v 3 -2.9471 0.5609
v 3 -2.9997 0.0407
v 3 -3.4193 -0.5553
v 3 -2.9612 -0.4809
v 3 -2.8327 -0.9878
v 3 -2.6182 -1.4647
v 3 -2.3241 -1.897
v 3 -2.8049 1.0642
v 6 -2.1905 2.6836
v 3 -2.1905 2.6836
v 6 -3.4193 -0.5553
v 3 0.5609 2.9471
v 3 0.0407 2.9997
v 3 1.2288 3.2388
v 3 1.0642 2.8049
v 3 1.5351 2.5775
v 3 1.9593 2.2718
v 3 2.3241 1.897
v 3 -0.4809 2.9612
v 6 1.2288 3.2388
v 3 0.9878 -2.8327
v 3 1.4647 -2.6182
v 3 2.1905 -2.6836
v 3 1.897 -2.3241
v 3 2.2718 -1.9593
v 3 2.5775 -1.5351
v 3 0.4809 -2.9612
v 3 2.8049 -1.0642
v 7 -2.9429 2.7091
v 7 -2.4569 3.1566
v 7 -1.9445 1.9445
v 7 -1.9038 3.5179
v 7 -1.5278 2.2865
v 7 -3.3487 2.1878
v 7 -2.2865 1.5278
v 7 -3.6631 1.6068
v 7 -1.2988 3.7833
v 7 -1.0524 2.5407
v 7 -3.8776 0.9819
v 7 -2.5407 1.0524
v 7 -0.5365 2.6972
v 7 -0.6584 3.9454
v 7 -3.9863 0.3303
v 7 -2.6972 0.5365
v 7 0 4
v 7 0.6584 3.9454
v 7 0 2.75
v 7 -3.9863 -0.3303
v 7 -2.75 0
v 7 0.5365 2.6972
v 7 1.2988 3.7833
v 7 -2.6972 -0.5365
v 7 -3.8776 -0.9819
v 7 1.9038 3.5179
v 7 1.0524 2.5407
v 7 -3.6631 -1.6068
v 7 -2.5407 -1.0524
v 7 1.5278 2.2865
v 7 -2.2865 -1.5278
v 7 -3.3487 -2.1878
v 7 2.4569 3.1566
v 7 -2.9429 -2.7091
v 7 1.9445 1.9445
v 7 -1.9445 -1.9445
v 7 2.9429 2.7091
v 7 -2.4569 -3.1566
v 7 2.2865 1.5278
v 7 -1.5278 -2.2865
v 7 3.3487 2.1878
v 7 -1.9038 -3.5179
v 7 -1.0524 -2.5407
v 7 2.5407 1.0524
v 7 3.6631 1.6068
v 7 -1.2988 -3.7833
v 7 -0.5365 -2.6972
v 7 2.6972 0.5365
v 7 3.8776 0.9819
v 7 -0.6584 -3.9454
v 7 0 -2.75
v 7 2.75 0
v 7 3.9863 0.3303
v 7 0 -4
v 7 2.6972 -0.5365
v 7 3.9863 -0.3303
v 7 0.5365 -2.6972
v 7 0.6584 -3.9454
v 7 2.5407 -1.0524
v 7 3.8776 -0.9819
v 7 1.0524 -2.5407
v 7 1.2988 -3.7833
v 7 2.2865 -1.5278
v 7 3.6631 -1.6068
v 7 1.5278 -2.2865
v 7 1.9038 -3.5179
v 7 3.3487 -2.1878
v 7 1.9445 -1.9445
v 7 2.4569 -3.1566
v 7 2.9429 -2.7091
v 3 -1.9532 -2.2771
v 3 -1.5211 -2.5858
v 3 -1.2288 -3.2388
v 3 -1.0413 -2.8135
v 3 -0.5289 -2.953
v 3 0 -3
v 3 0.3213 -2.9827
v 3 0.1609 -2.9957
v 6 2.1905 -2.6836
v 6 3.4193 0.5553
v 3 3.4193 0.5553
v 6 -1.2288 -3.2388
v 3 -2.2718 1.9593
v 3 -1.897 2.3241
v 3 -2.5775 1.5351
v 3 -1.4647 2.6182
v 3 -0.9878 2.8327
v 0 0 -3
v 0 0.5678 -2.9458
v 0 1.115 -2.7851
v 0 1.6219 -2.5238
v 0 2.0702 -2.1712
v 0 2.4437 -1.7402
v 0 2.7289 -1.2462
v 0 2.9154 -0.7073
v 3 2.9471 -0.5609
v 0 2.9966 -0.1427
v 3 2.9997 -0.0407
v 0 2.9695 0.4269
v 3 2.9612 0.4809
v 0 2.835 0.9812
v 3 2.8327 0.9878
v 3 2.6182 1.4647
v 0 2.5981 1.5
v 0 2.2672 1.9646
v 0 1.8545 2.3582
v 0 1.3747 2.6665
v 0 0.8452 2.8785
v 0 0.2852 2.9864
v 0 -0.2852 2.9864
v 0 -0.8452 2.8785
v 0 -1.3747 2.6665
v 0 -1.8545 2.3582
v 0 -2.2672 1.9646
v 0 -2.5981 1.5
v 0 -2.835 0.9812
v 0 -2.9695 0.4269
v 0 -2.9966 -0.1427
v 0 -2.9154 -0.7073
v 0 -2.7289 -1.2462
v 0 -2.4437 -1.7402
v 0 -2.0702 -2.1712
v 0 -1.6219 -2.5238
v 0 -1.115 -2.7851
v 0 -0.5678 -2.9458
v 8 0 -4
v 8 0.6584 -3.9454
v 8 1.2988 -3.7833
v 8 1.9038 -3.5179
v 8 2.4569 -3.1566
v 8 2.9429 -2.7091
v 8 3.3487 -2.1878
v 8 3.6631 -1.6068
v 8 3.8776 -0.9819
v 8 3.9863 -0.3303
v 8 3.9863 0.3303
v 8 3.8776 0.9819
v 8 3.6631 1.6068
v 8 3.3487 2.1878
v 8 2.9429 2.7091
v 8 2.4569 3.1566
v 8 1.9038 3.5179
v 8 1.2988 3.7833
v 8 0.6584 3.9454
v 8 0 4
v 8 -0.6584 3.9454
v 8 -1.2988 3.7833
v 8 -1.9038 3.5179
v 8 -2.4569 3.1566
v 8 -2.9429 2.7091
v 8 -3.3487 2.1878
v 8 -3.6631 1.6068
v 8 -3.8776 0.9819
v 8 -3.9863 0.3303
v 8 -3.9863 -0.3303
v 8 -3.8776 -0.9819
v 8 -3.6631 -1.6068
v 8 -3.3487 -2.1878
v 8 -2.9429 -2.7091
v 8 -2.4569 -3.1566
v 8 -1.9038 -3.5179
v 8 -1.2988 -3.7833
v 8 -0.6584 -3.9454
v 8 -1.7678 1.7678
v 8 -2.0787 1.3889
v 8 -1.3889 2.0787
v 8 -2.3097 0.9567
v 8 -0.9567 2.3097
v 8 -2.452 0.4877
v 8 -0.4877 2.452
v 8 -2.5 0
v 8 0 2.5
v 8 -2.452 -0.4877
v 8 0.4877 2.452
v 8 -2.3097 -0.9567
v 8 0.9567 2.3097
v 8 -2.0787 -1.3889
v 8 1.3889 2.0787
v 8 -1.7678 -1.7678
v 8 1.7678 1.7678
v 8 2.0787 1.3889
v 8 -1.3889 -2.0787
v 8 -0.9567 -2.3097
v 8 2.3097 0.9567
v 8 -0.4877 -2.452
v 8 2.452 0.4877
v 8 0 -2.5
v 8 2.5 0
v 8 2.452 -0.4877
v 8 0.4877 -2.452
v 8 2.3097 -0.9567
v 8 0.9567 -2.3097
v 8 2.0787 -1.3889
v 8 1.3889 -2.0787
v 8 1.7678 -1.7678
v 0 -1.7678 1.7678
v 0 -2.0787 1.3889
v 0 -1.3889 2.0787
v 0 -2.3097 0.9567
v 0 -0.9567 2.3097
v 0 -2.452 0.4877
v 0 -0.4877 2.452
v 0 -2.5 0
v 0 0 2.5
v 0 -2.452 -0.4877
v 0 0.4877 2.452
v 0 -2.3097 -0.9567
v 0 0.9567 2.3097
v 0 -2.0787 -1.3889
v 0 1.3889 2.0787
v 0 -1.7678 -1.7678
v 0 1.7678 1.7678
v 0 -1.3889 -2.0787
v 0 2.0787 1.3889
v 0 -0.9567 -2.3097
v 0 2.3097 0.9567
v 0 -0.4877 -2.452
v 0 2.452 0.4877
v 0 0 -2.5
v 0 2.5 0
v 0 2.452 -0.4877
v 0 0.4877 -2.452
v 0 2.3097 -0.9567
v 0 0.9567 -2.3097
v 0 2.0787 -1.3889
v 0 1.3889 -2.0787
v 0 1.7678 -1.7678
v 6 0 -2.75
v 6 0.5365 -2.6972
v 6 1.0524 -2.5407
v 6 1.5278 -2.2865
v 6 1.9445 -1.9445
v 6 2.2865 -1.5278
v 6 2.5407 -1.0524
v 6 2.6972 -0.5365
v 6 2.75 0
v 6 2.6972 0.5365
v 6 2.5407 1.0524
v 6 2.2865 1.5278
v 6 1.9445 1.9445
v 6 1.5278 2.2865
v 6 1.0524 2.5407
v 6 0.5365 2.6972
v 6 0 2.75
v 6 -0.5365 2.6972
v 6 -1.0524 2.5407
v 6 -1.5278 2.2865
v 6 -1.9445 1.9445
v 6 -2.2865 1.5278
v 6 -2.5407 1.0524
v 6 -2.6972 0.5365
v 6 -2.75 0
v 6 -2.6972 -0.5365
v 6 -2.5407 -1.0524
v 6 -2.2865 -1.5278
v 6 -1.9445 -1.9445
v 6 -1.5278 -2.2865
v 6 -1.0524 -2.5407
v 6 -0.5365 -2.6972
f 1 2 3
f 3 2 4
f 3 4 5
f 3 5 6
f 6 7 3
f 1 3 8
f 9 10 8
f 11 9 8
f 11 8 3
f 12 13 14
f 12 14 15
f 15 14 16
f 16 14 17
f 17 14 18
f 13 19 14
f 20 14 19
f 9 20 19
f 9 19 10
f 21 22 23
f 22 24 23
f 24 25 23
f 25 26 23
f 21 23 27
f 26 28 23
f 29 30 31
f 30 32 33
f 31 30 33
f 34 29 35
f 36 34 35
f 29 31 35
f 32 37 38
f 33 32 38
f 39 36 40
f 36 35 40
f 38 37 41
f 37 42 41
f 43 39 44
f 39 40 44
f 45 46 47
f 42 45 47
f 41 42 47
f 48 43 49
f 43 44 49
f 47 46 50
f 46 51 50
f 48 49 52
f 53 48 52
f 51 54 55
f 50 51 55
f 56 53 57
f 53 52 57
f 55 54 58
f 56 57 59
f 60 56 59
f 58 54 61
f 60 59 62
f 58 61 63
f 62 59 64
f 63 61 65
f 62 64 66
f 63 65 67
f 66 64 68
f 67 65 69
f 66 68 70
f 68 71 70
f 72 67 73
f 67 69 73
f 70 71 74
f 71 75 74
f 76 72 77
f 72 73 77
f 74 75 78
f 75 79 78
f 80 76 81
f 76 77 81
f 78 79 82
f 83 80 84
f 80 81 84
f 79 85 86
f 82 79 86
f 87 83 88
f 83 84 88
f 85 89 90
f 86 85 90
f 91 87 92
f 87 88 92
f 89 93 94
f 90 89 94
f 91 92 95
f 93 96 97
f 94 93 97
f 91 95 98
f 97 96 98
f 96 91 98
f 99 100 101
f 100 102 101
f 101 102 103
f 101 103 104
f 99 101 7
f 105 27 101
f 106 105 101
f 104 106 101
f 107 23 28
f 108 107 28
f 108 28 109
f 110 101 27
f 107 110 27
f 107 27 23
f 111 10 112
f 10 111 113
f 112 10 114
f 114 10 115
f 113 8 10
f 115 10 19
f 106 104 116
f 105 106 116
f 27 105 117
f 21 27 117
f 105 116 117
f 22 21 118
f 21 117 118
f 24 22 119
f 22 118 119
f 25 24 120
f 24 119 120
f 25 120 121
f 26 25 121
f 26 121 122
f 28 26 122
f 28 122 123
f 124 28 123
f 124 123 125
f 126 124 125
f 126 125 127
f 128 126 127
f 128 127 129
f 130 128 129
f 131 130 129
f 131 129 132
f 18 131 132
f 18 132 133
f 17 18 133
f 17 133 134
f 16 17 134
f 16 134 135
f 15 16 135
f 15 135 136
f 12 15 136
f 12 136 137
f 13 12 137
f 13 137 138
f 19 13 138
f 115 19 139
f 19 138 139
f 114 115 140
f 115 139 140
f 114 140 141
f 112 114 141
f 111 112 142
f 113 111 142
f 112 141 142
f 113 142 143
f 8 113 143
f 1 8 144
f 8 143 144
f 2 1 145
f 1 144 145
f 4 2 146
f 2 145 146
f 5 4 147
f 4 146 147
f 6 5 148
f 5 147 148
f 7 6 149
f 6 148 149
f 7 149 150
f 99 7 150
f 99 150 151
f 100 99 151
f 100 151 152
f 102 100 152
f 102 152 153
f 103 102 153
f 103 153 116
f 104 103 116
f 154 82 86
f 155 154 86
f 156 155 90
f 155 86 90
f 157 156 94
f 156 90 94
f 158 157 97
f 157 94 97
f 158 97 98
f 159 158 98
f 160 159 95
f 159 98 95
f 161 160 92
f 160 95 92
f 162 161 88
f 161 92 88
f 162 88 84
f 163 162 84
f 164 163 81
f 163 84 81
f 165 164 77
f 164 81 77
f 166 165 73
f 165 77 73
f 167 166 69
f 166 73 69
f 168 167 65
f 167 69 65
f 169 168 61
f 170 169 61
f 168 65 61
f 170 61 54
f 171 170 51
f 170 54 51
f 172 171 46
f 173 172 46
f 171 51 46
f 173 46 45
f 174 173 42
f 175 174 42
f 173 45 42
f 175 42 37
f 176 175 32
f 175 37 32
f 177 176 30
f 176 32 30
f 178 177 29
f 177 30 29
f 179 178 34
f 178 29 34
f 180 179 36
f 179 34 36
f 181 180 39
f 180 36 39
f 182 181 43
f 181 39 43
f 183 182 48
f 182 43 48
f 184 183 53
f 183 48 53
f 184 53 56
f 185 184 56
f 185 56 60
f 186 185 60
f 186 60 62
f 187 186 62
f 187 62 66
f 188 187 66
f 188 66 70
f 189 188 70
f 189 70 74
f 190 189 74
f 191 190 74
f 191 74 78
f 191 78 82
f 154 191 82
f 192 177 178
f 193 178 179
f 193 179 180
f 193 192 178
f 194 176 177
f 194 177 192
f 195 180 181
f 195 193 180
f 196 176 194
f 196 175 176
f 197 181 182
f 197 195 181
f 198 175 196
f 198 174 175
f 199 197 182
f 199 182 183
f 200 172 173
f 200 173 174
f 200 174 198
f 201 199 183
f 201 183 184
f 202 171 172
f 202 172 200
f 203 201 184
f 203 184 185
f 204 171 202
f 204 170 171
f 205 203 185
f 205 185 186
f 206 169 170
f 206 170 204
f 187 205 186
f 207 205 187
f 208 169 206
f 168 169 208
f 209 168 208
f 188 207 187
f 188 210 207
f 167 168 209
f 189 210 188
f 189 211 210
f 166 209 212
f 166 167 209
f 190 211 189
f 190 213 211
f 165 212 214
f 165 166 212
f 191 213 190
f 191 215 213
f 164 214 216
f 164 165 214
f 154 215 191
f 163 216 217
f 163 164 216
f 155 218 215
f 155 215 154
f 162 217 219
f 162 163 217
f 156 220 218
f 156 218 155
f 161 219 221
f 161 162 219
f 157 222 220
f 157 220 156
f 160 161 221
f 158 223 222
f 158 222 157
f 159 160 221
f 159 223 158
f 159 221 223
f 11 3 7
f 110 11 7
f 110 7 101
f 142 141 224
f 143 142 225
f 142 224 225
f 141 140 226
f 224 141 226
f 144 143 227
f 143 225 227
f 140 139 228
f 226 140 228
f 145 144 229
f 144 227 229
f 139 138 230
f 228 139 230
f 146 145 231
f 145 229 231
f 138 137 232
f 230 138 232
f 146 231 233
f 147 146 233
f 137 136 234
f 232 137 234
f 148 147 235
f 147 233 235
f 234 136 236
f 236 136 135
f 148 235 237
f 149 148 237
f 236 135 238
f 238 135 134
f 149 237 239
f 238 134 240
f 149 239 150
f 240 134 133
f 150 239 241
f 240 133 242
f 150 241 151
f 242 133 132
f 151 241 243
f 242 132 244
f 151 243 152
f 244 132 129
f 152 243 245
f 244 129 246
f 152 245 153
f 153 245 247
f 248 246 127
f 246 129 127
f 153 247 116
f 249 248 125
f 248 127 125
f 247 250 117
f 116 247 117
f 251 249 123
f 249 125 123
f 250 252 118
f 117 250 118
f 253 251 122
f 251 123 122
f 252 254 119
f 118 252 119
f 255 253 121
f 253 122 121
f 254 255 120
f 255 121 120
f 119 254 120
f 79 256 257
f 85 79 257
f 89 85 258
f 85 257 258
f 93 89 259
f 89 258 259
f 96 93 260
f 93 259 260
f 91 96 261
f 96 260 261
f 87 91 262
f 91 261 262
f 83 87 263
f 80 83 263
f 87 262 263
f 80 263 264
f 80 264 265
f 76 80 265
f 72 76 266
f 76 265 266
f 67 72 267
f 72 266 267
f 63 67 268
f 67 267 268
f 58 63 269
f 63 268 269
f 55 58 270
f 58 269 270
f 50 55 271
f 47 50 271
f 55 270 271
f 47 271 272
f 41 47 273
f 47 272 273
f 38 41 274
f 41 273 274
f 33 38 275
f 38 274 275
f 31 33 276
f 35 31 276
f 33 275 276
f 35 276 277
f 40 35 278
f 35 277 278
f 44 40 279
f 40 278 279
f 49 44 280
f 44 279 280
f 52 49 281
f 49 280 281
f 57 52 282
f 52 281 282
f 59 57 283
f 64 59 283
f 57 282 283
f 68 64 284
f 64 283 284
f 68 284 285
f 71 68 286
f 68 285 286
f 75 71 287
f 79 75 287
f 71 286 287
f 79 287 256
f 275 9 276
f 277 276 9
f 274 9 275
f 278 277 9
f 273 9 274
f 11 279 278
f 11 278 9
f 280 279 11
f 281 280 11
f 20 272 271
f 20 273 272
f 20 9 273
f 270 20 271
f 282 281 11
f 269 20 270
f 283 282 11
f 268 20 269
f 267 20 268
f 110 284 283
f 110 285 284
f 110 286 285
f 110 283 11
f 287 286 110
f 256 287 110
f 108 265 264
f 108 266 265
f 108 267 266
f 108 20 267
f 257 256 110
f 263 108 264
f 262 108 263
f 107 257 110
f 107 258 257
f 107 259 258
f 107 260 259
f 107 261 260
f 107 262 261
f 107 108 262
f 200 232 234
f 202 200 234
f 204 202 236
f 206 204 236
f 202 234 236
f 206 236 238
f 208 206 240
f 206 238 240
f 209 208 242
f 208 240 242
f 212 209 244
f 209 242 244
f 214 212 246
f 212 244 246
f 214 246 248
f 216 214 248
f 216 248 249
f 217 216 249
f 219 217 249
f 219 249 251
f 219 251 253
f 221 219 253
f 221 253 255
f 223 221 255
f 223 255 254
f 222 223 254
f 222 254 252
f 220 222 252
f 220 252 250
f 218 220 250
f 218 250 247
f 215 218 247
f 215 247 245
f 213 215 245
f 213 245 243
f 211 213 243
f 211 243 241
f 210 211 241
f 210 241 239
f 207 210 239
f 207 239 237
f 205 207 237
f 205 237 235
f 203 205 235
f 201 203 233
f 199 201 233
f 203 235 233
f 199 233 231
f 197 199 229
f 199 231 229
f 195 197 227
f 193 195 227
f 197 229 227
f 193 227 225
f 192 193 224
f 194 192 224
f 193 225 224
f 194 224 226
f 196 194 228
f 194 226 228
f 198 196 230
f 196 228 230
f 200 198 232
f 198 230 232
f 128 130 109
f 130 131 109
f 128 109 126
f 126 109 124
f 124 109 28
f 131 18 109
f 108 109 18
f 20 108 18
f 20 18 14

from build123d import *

# Parameters (mm, degrees)
SKETCH_1_R          = 3
EXTRUDE_1_DEPTH     = 3
EXTRUDE_2_DEPTH     = 3
SKETCH_3_R          = 2.75
EXTRUDE_3_DEPTH     = 1
SKETCH_4_R          = 4
EXTRUDE_4_DEPTH     = 1
SKETCH_5_R          = 2.5
CUT_EXTRUDE_1_DEPTH = 10.797958971


with BuildPart() as part:
    # 草图1 → 凸台-拉伸1 (new body)
    with BuildSketch(Plane(origin=(0, 0, 0), x_dir=(0, 0, -1), z_dir=(1, 0, 0))):
        Circle(SKETCH_1_R)
    extrude(amount=EXTRUDE_1_DEPTH)

    # 草图2 → 凸台-拉伸2 (add)
    with BuildSketch(Plane(origin=(3, 0, 0), x_dir=(0, 0, -1), z_dir=(1, 0, 0))):
        Polygon((3.238836652, -1.228794996), (2.683586009, 2.190517321), (-0.555250643, 3.419312317), (-3.238836652, 1.228794996), (-2.683586009, -2.190517321), (0.555250643, -3.419312317), align=None)
    extrude(amount=EXTRUDE_2_DEPTH)

    # 草图3 → 凸台-拉伸3 (add)
    with BuildSketch(Plane(origin=(6, 0, 0), x_dir=(0, 0, -1), z_dir=(1, 0, 0))):
        Circle(SKETCH_3_R)
    extrude(amount=EXTRUDE_3_DEPTH)

    # 草图4 → 凸台-拉伸4 (add)
    with BuildSketch(Plane(origin=(7, 0, 0), x_dir=(0, 0, -1), z_dir=(1, 0, 0))):
        Circle(SKETCH_4_R)
    extrude(amount=EXTRUDE_4_DEPTH)

    # 草图5 → 切除-拉伸1 (cut, through all)
    with BuildSketch(Plane.ZY):
        Circle(SKETCH_5_R)
    extrude(amount=-CUT_EXTRUDE_1_DEPTH, mode=Mode.SUBTRACT)


solid = part.part
